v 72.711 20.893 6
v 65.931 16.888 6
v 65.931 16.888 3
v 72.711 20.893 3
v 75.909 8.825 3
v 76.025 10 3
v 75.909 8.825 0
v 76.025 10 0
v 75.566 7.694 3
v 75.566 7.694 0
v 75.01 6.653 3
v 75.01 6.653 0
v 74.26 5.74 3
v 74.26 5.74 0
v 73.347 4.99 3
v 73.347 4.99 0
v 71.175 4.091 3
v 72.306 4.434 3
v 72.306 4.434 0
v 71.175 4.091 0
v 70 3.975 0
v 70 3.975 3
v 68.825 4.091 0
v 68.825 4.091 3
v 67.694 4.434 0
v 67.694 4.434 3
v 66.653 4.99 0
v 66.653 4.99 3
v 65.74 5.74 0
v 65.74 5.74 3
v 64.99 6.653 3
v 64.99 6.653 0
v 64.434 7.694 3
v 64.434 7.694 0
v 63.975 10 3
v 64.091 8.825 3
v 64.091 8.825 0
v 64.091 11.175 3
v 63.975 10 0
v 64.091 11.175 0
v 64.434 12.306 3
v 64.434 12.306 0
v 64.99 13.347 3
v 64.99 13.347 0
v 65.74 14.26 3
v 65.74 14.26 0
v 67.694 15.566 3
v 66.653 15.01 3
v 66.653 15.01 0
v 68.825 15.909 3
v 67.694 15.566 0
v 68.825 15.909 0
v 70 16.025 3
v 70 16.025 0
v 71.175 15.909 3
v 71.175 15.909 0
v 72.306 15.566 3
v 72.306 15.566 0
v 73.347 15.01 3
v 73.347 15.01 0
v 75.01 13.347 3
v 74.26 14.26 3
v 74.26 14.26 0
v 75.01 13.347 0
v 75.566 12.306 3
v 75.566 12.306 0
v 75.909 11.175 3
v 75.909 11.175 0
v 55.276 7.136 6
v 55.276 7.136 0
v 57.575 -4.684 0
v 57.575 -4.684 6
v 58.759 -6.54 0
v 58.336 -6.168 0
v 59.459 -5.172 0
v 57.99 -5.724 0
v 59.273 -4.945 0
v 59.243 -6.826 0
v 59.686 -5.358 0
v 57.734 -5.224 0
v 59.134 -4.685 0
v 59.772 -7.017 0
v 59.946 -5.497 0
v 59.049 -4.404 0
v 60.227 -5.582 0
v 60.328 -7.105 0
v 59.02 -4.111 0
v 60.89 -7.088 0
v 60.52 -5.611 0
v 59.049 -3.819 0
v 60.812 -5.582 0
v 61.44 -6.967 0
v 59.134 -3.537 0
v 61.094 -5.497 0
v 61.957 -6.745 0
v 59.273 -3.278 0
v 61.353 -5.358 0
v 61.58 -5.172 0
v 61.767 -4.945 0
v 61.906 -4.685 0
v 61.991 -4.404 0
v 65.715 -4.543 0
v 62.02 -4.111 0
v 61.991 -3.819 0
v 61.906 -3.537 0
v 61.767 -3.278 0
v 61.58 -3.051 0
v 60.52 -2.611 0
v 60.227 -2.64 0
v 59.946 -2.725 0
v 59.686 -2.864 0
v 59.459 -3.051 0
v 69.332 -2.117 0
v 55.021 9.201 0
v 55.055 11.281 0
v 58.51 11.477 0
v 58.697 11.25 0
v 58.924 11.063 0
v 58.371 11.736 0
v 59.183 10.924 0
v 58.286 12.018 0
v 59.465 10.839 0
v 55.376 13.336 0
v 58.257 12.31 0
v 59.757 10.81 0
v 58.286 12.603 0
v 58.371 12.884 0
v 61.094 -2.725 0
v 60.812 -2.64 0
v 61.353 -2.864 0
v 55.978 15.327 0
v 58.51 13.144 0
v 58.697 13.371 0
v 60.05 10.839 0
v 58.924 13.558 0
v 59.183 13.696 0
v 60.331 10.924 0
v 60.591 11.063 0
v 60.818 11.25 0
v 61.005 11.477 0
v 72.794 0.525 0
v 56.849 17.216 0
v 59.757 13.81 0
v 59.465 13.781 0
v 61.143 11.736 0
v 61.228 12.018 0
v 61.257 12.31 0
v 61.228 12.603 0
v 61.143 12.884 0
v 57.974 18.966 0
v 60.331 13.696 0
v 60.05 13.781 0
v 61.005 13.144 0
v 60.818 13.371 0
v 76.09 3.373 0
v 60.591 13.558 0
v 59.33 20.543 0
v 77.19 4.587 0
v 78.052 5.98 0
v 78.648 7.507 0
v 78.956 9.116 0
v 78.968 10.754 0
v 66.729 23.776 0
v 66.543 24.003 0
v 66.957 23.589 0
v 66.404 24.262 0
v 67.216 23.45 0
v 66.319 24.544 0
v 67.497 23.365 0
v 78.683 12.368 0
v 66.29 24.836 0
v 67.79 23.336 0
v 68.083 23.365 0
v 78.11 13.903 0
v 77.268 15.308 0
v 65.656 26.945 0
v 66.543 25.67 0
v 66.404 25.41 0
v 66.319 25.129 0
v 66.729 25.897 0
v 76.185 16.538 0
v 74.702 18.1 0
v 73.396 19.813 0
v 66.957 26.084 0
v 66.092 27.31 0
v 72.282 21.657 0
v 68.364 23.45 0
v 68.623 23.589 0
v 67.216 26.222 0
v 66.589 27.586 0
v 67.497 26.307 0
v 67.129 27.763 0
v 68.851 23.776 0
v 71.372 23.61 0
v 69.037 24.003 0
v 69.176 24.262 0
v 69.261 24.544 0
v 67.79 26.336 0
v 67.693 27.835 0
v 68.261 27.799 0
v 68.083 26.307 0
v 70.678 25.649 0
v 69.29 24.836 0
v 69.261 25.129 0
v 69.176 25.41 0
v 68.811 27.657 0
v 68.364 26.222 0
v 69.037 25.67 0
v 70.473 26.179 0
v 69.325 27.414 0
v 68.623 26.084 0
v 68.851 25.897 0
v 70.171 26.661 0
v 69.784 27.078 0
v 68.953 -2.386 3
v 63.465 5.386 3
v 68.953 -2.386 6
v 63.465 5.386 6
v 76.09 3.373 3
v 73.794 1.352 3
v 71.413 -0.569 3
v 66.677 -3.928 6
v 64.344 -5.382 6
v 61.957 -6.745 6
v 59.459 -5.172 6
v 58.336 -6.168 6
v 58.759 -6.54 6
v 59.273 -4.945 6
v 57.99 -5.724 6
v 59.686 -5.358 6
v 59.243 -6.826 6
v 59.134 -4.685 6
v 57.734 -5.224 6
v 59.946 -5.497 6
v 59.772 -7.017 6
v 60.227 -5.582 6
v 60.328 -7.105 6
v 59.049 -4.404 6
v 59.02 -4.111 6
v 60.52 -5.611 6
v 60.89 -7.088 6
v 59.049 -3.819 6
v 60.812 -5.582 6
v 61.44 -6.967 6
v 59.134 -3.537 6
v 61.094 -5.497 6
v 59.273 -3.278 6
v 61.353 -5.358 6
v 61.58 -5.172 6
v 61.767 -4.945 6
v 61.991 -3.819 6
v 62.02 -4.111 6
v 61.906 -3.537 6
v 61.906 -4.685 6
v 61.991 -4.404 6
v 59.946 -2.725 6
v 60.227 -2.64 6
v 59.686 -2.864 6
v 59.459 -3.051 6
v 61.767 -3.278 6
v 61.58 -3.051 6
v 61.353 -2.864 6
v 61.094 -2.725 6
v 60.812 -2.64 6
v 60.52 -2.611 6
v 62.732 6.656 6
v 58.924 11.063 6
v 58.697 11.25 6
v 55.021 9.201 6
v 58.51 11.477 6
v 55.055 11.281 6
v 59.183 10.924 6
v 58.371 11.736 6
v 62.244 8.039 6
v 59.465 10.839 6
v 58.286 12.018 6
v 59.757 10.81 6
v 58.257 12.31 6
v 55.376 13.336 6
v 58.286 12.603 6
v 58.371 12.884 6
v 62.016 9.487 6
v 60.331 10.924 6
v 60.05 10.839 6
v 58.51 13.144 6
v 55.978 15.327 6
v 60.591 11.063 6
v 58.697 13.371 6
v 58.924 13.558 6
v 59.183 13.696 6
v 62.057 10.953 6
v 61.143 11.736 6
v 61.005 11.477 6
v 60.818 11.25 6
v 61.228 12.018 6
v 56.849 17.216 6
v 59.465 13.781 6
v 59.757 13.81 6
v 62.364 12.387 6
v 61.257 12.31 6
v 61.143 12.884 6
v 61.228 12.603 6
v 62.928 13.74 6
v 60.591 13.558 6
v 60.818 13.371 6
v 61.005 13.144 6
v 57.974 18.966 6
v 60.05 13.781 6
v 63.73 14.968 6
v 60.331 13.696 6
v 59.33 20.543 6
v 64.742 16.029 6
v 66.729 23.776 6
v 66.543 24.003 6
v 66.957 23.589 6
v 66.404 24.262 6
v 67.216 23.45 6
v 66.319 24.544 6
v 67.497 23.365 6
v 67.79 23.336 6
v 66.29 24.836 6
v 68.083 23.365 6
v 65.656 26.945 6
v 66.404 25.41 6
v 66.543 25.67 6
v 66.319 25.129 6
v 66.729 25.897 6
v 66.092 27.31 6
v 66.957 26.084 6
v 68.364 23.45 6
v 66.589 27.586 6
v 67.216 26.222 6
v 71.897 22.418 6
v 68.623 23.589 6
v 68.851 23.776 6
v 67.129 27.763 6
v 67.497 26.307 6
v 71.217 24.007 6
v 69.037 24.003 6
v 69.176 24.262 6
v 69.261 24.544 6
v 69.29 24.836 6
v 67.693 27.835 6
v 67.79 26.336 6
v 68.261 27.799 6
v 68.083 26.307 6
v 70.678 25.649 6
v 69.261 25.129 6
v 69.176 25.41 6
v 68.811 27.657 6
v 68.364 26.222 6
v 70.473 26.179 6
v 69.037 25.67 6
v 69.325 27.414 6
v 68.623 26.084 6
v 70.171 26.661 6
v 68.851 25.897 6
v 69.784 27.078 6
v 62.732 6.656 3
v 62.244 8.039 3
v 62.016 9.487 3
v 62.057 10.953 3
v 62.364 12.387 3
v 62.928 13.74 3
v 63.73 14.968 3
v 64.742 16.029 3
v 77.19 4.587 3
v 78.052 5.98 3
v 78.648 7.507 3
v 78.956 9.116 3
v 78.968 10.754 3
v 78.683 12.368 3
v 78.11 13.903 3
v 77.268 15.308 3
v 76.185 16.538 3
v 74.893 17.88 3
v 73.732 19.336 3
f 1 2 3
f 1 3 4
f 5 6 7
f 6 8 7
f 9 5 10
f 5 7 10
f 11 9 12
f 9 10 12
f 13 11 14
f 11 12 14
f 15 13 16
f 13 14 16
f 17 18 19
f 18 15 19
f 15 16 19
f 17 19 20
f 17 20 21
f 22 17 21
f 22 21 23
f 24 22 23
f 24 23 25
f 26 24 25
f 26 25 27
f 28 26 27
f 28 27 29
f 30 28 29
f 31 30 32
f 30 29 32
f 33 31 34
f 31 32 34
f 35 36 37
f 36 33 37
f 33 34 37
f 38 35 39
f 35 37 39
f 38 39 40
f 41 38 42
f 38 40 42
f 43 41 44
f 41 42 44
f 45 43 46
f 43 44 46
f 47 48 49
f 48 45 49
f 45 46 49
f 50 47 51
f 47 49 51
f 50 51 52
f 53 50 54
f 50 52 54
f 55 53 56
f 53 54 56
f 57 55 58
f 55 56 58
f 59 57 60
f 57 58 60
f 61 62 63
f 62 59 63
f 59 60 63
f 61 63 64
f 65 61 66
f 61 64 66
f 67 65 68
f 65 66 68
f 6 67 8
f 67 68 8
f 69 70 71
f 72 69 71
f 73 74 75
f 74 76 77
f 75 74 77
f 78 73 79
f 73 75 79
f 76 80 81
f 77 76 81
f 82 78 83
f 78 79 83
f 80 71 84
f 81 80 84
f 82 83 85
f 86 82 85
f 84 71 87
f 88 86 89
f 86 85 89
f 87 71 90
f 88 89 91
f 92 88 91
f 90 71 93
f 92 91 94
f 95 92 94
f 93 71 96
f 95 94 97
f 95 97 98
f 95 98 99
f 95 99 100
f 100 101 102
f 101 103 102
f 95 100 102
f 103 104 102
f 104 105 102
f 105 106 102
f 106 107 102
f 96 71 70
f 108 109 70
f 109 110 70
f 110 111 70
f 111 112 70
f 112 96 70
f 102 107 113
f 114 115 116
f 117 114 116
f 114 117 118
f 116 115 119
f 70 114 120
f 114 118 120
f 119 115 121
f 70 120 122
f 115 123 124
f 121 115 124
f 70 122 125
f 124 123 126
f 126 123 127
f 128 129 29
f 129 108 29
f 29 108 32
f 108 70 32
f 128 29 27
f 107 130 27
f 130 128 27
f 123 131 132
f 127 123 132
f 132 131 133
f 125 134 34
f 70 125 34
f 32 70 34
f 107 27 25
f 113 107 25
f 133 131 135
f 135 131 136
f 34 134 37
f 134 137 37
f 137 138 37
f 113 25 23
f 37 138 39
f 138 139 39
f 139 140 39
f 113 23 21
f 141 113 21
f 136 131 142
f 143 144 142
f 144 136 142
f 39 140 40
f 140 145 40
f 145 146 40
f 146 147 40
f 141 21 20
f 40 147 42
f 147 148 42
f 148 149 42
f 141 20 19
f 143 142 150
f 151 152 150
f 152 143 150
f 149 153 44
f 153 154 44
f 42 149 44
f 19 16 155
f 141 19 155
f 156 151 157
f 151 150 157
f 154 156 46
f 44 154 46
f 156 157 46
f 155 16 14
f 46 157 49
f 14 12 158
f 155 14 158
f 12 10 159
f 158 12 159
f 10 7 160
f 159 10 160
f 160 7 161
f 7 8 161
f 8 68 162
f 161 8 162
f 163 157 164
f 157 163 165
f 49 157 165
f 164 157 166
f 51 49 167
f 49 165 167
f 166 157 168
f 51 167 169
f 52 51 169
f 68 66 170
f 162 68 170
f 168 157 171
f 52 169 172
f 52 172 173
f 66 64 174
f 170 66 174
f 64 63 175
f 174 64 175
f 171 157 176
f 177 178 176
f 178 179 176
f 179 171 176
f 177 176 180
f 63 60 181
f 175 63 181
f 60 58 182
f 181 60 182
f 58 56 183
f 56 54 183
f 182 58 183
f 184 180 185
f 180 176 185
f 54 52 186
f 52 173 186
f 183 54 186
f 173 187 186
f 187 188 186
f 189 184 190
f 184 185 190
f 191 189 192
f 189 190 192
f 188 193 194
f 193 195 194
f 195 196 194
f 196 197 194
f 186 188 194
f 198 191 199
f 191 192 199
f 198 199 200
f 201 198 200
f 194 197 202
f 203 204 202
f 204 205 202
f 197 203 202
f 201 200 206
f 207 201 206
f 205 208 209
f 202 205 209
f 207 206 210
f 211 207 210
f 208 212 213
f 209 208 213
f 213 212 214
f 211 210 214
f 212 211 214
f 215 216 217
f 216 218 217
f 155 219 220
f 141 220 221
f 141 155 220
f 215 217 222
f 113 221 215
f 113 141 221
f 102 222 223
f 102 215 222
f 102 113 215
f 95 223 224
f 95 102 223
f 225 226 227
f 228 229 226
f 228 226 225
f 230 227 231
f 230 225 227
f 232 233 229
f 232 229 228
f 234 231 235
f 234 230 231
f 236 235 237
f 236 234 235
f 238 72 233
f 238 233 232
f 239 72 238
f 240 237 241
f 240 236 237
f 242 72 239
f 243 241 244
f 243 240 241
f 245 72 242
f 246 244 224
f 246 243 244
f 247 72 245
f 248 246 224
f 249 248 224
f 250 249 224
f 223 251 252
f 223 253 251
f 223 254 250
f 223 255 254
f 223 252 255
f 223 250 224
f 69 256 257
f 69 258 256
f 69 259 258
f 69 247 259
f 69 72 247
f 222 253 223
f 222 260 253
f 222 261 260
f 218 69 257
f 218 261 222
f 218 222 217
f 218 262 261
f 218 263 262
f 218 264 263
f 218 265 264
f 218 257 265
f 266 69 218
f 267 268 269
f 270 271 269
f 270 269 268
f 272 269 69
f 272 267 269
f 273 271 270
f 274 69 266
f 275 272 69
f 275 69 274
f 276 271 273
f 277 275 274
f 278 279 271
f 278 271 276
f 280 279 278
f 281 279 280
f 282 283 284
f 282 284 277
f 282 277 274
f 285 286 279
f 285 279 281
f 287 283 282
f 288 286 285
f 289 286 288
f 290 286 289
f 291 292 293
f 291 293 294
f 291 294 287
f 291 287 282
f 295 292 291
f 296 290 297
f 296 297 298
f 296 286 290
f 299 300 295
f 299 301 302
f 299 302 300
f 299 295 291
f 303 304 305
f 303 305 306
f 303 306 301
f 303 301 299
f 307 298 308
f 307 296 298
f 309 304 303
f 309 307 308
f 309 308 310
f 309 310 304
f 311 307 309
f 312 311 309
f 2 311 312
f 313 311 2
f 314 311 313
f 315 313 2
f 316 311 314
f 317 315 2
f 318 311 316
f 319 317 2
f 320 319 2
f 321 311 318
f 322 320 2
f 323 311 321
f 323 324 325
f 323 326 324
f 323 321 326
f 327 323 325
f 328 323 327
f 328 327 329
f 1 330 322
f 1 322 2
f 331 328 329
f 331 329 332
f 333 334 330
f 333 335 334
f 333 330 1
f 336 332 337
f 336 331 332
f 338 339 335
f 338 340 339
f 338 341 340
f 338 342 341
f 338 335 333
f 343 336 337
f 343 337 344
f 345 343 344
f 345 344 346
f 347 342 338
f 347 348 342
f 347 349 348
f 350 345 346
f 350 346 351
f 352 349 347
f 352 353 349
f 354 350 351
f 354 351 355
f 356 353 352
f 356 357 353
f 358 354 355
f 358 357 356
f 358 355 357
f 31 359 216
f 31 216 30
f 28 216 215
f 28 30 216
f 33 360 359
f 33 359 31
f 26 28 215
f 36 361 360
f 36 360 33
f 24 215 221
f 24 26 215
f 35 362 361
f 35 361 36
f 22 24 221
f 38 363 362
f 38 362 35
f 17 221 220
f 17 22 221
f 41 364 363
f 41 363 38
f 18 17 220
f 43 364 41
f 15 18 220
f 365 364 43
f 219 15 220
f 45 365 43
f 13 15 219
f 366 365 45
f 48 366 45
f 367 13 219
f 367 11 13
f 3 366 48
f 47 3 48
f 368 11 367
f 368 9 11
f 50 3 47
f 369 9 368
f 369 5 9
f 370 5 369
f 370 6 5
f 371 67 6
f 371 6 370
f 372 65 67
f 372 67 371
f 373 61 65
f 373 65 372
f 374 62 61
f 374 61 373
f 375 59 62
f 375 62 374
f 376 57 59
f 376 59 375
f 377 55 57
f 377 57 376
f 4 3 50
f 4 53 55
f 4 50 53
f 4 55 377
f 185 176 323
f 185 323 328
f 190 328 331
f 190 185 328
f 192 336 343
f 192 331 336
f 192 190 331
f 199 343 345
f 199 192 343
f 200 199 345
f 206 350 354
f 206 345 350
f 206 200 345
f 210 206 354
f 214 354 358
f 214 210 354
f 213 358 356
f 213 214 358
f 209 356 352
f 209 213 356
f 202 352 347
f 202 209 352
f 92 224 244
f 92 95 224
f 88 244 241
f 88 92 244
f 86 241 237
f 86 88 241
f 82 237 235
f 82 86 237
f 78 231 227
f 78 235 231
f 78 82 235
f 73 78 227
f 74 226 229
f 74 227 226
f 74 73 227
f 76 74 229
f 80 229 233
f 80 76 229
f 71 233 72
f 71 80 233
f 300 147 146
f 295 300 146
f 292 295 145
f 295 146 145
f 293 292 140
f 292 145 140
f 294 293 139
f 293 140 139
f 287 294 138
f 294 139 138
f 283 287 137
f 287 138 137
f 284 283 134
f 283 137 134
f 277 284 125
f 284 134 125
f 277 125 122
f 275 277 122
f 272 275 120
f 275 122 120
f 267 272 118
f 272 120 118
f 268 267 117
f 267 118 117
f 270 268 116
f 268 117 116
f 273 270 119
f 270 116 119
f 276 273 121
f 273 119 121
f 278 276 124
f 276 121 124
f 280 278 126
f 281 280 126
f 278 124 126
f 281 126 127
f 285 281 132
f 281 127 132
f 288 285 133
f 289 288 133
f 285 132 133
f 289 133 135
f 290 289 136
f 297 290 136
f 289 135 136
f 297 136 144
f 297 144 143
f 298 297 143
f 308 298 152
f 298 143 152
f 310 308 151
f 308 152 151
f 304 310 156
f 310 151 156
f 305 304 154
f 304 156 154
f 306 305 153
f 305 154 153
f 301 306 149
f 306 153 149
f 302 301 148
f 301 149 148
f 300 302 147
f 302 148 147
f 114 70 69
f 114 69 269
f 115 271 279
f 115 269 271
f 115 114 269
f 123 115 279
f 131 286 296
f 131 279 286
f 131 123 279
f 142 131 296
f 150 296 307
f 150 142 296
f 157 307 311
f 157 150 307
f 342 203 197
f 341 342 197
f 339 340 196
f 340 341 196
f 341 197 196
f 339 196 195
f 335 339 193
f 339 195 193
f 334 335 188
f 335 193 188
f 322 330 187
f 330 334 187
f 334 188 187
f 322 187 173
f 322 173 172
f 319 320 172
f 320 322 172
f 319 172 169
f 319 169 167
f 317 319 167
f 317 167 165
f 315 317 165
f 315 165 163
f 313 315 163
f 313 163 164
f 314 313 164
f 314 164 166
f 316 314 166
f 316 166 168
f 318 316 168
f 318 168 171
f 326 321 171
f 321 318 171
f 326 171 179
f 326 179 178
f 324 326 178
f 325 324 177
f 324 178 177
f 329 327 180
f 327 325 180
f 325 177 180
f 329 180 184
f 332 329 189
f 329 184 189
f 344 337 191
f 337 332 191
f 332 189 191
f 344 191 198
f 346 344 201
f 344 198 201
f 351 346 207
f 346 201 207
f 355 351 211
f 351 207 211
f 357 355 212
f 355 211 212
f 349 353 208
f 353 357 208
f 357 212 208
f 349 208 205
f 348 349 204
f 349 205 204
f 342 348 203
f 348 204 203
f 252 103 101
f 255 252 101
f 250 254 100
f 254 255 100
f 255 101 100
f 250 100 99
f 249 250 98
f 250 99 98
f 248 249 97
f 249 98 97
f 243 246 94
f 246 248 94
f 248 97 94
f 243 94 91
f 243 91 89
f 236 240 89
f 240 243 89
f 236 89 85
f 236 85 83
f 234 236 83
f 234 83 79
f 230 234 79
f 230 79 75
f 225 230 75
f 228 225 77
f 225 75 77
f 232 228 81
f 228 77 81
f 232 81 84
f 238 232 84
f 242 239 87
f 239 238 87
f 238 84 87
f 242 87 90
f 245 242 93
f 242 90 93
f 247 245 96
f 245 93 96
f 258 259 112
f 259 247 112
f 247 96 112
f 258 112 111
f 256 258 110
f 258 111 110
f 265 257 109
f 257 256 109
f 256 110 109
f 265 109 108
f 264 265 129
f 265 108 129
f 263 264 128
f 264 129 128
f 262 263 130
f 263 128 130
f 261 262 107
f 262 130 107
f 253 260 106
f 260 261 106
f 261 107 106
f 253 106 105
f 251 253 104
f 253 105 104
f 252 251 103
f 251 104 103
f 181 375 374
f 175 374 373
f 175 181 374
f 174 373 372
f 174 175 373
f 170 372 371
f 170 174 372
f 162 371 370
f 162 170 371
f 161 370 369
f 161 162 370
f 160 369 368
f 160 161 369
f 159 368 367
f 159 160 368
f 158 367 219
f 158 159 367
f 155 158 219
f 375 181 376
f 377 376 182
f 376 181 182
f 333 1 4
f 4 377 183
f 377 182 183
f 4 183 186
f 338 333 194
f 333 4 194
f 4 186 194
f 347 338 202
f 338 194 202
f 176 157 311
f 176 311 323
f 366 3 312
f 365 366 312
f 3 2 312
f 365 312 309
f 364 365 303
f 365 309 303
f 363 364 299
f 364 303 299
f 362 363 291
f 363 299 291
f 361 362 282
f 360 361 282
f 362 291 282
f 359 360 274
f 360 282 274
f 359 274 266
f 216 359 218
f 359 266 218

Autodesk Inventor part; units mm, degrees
ref_plane "YZ Plane" through (0, 0, 0) normal (1, 0, 0) x (0, 1, 0)
ref_plane "XZ Plane" through (0, 0, 0) normal (0, 1, 0) x (-1, 0, 0)
ref_plane "XY Plane" through (0, 0, 0) normal (0, 0, 1) x (1, 0, 0)
sketch "スケッチ1" plane through (0, 0, 0) normal (0, 0, 1) x (1, 0, 0)
  circle A0 centre (70, 10) radius 6.025
  circle A1 centre (70, 10) radius 9
  arc A2 (70.8604, 37.0956) -> (76.1852, 16.5379) centre (89.93, 31.0664) ccw
  arc A3 (-3.9904, -8.067) -> (76.0896, 3.373) centre (27.7113, 56.0206) ccw
  arc A4 (70.6777, 25.6489) -> (65.6559, 26.9449) centre (67.7899, 24.8363) ccw
  arc A5 (59.3301, 20.543) -> (55.2759, 7.1361) centre (70, 10) ccw
  arc A6 (57.575, -4.684) -> (61.9566, -6.7447) centre (60.5198, -4.1112) ccw
  line L0 (67.7899, 24.8363) -> (70, 10) construction
  line L1 (70, 10) -> (60.5198, -4.1112) construction
  circle A7 centre (67.7899, 24.8363) radius 1.5
  circle A8 centre (60.5198, -4.1112) radius 1.5
  line L2 (70, 10) -> (59.7573, 12.3103) construction
  circle A9 centre (59.7573, 12.3103) radius 1.5
  line L3 (59.3301, 20.543) -> (65.6559, 26.9449)
  line L4 (55.2759, 7.1361) -> (57.575, -4.684)
  point P0 (0, 0)
  point P1 (0, 0)
  dimension "d0" = 3
  dimension "d1" = 3
  dimension "d2" = 3
  dimension "d3" = 3
  dimension "d4" = 3
  dimension "d5" = 15
  dimension "d6" = 17
extrude "押し出し1" add sketch "スケッチ1" along normal blind 6
sketch "スケッチ2" plane through (0, 0, 6) normal (0, 0, 1) x (1, 0, 0)
  point P0 (0, 0)
sketch "スケッチ3" plane through (0, 0, 6) normal (0, 0, 1) x (1, 0, 0)
  line L0 (65.6559, 26.9449) -> (59.3301, 20.543) projected
  arc A0 (59.3301, 20.543) -> (55.2759, 7.1361) centre (70, 10) ccw projected
  line L1 (55.2759, 7.1361) -> (57.575, -4.684) projected
  arc A1 (57.575, -4.684) -> (61.9566, -6.7447) centre (60.5198, -4.1112) ccw projected
  arc A2 (61.9566, -6.7447) -> (76.0896, 3.373) centre (27.7113, 56.0206) ccw projected
  arc A3 (76.0896, 3.373) -> (76.1852, 16.5379) centre (70, 10) ccw projected
  arc A4 (70.6777, 25.6489) -> (76.1852, 16.5379) centre (89.93, 31.0664) ccw projected
  arc A5 (70.6777, 25.6489) -> (65.6559, 26.9449) centre (67.7899, 24.8363) ccw projected
  circle A6 centre (70, 10) radius 6.025 projected
  circle A7 centre (59.7573, 12.3103) radius 1.5 projected
  circle A8 centre (67.7899, 24.8363) radius 1.5 projected
  circle A9 centre (60.5198, -4.1112) radius 1.5 projected
  circle A10 centre (70, 10) radius 8
  line L2 (65.9307, 16.8878) -> (72.7106, 20.8933)
  line L3 (63.4649, 5.3856) -> (68.9527, -2.3863)
  point P0 (0, 0)
  dimension "d9" = 16
extrude "押し出し2" cut sketch "スケッチ3" against normal blind 3 contours A4 A3 A2 L3 A10 L2 | A10
properties part number "前足フレーム補助パーツ" material "アルミニウム 2014-T6"
